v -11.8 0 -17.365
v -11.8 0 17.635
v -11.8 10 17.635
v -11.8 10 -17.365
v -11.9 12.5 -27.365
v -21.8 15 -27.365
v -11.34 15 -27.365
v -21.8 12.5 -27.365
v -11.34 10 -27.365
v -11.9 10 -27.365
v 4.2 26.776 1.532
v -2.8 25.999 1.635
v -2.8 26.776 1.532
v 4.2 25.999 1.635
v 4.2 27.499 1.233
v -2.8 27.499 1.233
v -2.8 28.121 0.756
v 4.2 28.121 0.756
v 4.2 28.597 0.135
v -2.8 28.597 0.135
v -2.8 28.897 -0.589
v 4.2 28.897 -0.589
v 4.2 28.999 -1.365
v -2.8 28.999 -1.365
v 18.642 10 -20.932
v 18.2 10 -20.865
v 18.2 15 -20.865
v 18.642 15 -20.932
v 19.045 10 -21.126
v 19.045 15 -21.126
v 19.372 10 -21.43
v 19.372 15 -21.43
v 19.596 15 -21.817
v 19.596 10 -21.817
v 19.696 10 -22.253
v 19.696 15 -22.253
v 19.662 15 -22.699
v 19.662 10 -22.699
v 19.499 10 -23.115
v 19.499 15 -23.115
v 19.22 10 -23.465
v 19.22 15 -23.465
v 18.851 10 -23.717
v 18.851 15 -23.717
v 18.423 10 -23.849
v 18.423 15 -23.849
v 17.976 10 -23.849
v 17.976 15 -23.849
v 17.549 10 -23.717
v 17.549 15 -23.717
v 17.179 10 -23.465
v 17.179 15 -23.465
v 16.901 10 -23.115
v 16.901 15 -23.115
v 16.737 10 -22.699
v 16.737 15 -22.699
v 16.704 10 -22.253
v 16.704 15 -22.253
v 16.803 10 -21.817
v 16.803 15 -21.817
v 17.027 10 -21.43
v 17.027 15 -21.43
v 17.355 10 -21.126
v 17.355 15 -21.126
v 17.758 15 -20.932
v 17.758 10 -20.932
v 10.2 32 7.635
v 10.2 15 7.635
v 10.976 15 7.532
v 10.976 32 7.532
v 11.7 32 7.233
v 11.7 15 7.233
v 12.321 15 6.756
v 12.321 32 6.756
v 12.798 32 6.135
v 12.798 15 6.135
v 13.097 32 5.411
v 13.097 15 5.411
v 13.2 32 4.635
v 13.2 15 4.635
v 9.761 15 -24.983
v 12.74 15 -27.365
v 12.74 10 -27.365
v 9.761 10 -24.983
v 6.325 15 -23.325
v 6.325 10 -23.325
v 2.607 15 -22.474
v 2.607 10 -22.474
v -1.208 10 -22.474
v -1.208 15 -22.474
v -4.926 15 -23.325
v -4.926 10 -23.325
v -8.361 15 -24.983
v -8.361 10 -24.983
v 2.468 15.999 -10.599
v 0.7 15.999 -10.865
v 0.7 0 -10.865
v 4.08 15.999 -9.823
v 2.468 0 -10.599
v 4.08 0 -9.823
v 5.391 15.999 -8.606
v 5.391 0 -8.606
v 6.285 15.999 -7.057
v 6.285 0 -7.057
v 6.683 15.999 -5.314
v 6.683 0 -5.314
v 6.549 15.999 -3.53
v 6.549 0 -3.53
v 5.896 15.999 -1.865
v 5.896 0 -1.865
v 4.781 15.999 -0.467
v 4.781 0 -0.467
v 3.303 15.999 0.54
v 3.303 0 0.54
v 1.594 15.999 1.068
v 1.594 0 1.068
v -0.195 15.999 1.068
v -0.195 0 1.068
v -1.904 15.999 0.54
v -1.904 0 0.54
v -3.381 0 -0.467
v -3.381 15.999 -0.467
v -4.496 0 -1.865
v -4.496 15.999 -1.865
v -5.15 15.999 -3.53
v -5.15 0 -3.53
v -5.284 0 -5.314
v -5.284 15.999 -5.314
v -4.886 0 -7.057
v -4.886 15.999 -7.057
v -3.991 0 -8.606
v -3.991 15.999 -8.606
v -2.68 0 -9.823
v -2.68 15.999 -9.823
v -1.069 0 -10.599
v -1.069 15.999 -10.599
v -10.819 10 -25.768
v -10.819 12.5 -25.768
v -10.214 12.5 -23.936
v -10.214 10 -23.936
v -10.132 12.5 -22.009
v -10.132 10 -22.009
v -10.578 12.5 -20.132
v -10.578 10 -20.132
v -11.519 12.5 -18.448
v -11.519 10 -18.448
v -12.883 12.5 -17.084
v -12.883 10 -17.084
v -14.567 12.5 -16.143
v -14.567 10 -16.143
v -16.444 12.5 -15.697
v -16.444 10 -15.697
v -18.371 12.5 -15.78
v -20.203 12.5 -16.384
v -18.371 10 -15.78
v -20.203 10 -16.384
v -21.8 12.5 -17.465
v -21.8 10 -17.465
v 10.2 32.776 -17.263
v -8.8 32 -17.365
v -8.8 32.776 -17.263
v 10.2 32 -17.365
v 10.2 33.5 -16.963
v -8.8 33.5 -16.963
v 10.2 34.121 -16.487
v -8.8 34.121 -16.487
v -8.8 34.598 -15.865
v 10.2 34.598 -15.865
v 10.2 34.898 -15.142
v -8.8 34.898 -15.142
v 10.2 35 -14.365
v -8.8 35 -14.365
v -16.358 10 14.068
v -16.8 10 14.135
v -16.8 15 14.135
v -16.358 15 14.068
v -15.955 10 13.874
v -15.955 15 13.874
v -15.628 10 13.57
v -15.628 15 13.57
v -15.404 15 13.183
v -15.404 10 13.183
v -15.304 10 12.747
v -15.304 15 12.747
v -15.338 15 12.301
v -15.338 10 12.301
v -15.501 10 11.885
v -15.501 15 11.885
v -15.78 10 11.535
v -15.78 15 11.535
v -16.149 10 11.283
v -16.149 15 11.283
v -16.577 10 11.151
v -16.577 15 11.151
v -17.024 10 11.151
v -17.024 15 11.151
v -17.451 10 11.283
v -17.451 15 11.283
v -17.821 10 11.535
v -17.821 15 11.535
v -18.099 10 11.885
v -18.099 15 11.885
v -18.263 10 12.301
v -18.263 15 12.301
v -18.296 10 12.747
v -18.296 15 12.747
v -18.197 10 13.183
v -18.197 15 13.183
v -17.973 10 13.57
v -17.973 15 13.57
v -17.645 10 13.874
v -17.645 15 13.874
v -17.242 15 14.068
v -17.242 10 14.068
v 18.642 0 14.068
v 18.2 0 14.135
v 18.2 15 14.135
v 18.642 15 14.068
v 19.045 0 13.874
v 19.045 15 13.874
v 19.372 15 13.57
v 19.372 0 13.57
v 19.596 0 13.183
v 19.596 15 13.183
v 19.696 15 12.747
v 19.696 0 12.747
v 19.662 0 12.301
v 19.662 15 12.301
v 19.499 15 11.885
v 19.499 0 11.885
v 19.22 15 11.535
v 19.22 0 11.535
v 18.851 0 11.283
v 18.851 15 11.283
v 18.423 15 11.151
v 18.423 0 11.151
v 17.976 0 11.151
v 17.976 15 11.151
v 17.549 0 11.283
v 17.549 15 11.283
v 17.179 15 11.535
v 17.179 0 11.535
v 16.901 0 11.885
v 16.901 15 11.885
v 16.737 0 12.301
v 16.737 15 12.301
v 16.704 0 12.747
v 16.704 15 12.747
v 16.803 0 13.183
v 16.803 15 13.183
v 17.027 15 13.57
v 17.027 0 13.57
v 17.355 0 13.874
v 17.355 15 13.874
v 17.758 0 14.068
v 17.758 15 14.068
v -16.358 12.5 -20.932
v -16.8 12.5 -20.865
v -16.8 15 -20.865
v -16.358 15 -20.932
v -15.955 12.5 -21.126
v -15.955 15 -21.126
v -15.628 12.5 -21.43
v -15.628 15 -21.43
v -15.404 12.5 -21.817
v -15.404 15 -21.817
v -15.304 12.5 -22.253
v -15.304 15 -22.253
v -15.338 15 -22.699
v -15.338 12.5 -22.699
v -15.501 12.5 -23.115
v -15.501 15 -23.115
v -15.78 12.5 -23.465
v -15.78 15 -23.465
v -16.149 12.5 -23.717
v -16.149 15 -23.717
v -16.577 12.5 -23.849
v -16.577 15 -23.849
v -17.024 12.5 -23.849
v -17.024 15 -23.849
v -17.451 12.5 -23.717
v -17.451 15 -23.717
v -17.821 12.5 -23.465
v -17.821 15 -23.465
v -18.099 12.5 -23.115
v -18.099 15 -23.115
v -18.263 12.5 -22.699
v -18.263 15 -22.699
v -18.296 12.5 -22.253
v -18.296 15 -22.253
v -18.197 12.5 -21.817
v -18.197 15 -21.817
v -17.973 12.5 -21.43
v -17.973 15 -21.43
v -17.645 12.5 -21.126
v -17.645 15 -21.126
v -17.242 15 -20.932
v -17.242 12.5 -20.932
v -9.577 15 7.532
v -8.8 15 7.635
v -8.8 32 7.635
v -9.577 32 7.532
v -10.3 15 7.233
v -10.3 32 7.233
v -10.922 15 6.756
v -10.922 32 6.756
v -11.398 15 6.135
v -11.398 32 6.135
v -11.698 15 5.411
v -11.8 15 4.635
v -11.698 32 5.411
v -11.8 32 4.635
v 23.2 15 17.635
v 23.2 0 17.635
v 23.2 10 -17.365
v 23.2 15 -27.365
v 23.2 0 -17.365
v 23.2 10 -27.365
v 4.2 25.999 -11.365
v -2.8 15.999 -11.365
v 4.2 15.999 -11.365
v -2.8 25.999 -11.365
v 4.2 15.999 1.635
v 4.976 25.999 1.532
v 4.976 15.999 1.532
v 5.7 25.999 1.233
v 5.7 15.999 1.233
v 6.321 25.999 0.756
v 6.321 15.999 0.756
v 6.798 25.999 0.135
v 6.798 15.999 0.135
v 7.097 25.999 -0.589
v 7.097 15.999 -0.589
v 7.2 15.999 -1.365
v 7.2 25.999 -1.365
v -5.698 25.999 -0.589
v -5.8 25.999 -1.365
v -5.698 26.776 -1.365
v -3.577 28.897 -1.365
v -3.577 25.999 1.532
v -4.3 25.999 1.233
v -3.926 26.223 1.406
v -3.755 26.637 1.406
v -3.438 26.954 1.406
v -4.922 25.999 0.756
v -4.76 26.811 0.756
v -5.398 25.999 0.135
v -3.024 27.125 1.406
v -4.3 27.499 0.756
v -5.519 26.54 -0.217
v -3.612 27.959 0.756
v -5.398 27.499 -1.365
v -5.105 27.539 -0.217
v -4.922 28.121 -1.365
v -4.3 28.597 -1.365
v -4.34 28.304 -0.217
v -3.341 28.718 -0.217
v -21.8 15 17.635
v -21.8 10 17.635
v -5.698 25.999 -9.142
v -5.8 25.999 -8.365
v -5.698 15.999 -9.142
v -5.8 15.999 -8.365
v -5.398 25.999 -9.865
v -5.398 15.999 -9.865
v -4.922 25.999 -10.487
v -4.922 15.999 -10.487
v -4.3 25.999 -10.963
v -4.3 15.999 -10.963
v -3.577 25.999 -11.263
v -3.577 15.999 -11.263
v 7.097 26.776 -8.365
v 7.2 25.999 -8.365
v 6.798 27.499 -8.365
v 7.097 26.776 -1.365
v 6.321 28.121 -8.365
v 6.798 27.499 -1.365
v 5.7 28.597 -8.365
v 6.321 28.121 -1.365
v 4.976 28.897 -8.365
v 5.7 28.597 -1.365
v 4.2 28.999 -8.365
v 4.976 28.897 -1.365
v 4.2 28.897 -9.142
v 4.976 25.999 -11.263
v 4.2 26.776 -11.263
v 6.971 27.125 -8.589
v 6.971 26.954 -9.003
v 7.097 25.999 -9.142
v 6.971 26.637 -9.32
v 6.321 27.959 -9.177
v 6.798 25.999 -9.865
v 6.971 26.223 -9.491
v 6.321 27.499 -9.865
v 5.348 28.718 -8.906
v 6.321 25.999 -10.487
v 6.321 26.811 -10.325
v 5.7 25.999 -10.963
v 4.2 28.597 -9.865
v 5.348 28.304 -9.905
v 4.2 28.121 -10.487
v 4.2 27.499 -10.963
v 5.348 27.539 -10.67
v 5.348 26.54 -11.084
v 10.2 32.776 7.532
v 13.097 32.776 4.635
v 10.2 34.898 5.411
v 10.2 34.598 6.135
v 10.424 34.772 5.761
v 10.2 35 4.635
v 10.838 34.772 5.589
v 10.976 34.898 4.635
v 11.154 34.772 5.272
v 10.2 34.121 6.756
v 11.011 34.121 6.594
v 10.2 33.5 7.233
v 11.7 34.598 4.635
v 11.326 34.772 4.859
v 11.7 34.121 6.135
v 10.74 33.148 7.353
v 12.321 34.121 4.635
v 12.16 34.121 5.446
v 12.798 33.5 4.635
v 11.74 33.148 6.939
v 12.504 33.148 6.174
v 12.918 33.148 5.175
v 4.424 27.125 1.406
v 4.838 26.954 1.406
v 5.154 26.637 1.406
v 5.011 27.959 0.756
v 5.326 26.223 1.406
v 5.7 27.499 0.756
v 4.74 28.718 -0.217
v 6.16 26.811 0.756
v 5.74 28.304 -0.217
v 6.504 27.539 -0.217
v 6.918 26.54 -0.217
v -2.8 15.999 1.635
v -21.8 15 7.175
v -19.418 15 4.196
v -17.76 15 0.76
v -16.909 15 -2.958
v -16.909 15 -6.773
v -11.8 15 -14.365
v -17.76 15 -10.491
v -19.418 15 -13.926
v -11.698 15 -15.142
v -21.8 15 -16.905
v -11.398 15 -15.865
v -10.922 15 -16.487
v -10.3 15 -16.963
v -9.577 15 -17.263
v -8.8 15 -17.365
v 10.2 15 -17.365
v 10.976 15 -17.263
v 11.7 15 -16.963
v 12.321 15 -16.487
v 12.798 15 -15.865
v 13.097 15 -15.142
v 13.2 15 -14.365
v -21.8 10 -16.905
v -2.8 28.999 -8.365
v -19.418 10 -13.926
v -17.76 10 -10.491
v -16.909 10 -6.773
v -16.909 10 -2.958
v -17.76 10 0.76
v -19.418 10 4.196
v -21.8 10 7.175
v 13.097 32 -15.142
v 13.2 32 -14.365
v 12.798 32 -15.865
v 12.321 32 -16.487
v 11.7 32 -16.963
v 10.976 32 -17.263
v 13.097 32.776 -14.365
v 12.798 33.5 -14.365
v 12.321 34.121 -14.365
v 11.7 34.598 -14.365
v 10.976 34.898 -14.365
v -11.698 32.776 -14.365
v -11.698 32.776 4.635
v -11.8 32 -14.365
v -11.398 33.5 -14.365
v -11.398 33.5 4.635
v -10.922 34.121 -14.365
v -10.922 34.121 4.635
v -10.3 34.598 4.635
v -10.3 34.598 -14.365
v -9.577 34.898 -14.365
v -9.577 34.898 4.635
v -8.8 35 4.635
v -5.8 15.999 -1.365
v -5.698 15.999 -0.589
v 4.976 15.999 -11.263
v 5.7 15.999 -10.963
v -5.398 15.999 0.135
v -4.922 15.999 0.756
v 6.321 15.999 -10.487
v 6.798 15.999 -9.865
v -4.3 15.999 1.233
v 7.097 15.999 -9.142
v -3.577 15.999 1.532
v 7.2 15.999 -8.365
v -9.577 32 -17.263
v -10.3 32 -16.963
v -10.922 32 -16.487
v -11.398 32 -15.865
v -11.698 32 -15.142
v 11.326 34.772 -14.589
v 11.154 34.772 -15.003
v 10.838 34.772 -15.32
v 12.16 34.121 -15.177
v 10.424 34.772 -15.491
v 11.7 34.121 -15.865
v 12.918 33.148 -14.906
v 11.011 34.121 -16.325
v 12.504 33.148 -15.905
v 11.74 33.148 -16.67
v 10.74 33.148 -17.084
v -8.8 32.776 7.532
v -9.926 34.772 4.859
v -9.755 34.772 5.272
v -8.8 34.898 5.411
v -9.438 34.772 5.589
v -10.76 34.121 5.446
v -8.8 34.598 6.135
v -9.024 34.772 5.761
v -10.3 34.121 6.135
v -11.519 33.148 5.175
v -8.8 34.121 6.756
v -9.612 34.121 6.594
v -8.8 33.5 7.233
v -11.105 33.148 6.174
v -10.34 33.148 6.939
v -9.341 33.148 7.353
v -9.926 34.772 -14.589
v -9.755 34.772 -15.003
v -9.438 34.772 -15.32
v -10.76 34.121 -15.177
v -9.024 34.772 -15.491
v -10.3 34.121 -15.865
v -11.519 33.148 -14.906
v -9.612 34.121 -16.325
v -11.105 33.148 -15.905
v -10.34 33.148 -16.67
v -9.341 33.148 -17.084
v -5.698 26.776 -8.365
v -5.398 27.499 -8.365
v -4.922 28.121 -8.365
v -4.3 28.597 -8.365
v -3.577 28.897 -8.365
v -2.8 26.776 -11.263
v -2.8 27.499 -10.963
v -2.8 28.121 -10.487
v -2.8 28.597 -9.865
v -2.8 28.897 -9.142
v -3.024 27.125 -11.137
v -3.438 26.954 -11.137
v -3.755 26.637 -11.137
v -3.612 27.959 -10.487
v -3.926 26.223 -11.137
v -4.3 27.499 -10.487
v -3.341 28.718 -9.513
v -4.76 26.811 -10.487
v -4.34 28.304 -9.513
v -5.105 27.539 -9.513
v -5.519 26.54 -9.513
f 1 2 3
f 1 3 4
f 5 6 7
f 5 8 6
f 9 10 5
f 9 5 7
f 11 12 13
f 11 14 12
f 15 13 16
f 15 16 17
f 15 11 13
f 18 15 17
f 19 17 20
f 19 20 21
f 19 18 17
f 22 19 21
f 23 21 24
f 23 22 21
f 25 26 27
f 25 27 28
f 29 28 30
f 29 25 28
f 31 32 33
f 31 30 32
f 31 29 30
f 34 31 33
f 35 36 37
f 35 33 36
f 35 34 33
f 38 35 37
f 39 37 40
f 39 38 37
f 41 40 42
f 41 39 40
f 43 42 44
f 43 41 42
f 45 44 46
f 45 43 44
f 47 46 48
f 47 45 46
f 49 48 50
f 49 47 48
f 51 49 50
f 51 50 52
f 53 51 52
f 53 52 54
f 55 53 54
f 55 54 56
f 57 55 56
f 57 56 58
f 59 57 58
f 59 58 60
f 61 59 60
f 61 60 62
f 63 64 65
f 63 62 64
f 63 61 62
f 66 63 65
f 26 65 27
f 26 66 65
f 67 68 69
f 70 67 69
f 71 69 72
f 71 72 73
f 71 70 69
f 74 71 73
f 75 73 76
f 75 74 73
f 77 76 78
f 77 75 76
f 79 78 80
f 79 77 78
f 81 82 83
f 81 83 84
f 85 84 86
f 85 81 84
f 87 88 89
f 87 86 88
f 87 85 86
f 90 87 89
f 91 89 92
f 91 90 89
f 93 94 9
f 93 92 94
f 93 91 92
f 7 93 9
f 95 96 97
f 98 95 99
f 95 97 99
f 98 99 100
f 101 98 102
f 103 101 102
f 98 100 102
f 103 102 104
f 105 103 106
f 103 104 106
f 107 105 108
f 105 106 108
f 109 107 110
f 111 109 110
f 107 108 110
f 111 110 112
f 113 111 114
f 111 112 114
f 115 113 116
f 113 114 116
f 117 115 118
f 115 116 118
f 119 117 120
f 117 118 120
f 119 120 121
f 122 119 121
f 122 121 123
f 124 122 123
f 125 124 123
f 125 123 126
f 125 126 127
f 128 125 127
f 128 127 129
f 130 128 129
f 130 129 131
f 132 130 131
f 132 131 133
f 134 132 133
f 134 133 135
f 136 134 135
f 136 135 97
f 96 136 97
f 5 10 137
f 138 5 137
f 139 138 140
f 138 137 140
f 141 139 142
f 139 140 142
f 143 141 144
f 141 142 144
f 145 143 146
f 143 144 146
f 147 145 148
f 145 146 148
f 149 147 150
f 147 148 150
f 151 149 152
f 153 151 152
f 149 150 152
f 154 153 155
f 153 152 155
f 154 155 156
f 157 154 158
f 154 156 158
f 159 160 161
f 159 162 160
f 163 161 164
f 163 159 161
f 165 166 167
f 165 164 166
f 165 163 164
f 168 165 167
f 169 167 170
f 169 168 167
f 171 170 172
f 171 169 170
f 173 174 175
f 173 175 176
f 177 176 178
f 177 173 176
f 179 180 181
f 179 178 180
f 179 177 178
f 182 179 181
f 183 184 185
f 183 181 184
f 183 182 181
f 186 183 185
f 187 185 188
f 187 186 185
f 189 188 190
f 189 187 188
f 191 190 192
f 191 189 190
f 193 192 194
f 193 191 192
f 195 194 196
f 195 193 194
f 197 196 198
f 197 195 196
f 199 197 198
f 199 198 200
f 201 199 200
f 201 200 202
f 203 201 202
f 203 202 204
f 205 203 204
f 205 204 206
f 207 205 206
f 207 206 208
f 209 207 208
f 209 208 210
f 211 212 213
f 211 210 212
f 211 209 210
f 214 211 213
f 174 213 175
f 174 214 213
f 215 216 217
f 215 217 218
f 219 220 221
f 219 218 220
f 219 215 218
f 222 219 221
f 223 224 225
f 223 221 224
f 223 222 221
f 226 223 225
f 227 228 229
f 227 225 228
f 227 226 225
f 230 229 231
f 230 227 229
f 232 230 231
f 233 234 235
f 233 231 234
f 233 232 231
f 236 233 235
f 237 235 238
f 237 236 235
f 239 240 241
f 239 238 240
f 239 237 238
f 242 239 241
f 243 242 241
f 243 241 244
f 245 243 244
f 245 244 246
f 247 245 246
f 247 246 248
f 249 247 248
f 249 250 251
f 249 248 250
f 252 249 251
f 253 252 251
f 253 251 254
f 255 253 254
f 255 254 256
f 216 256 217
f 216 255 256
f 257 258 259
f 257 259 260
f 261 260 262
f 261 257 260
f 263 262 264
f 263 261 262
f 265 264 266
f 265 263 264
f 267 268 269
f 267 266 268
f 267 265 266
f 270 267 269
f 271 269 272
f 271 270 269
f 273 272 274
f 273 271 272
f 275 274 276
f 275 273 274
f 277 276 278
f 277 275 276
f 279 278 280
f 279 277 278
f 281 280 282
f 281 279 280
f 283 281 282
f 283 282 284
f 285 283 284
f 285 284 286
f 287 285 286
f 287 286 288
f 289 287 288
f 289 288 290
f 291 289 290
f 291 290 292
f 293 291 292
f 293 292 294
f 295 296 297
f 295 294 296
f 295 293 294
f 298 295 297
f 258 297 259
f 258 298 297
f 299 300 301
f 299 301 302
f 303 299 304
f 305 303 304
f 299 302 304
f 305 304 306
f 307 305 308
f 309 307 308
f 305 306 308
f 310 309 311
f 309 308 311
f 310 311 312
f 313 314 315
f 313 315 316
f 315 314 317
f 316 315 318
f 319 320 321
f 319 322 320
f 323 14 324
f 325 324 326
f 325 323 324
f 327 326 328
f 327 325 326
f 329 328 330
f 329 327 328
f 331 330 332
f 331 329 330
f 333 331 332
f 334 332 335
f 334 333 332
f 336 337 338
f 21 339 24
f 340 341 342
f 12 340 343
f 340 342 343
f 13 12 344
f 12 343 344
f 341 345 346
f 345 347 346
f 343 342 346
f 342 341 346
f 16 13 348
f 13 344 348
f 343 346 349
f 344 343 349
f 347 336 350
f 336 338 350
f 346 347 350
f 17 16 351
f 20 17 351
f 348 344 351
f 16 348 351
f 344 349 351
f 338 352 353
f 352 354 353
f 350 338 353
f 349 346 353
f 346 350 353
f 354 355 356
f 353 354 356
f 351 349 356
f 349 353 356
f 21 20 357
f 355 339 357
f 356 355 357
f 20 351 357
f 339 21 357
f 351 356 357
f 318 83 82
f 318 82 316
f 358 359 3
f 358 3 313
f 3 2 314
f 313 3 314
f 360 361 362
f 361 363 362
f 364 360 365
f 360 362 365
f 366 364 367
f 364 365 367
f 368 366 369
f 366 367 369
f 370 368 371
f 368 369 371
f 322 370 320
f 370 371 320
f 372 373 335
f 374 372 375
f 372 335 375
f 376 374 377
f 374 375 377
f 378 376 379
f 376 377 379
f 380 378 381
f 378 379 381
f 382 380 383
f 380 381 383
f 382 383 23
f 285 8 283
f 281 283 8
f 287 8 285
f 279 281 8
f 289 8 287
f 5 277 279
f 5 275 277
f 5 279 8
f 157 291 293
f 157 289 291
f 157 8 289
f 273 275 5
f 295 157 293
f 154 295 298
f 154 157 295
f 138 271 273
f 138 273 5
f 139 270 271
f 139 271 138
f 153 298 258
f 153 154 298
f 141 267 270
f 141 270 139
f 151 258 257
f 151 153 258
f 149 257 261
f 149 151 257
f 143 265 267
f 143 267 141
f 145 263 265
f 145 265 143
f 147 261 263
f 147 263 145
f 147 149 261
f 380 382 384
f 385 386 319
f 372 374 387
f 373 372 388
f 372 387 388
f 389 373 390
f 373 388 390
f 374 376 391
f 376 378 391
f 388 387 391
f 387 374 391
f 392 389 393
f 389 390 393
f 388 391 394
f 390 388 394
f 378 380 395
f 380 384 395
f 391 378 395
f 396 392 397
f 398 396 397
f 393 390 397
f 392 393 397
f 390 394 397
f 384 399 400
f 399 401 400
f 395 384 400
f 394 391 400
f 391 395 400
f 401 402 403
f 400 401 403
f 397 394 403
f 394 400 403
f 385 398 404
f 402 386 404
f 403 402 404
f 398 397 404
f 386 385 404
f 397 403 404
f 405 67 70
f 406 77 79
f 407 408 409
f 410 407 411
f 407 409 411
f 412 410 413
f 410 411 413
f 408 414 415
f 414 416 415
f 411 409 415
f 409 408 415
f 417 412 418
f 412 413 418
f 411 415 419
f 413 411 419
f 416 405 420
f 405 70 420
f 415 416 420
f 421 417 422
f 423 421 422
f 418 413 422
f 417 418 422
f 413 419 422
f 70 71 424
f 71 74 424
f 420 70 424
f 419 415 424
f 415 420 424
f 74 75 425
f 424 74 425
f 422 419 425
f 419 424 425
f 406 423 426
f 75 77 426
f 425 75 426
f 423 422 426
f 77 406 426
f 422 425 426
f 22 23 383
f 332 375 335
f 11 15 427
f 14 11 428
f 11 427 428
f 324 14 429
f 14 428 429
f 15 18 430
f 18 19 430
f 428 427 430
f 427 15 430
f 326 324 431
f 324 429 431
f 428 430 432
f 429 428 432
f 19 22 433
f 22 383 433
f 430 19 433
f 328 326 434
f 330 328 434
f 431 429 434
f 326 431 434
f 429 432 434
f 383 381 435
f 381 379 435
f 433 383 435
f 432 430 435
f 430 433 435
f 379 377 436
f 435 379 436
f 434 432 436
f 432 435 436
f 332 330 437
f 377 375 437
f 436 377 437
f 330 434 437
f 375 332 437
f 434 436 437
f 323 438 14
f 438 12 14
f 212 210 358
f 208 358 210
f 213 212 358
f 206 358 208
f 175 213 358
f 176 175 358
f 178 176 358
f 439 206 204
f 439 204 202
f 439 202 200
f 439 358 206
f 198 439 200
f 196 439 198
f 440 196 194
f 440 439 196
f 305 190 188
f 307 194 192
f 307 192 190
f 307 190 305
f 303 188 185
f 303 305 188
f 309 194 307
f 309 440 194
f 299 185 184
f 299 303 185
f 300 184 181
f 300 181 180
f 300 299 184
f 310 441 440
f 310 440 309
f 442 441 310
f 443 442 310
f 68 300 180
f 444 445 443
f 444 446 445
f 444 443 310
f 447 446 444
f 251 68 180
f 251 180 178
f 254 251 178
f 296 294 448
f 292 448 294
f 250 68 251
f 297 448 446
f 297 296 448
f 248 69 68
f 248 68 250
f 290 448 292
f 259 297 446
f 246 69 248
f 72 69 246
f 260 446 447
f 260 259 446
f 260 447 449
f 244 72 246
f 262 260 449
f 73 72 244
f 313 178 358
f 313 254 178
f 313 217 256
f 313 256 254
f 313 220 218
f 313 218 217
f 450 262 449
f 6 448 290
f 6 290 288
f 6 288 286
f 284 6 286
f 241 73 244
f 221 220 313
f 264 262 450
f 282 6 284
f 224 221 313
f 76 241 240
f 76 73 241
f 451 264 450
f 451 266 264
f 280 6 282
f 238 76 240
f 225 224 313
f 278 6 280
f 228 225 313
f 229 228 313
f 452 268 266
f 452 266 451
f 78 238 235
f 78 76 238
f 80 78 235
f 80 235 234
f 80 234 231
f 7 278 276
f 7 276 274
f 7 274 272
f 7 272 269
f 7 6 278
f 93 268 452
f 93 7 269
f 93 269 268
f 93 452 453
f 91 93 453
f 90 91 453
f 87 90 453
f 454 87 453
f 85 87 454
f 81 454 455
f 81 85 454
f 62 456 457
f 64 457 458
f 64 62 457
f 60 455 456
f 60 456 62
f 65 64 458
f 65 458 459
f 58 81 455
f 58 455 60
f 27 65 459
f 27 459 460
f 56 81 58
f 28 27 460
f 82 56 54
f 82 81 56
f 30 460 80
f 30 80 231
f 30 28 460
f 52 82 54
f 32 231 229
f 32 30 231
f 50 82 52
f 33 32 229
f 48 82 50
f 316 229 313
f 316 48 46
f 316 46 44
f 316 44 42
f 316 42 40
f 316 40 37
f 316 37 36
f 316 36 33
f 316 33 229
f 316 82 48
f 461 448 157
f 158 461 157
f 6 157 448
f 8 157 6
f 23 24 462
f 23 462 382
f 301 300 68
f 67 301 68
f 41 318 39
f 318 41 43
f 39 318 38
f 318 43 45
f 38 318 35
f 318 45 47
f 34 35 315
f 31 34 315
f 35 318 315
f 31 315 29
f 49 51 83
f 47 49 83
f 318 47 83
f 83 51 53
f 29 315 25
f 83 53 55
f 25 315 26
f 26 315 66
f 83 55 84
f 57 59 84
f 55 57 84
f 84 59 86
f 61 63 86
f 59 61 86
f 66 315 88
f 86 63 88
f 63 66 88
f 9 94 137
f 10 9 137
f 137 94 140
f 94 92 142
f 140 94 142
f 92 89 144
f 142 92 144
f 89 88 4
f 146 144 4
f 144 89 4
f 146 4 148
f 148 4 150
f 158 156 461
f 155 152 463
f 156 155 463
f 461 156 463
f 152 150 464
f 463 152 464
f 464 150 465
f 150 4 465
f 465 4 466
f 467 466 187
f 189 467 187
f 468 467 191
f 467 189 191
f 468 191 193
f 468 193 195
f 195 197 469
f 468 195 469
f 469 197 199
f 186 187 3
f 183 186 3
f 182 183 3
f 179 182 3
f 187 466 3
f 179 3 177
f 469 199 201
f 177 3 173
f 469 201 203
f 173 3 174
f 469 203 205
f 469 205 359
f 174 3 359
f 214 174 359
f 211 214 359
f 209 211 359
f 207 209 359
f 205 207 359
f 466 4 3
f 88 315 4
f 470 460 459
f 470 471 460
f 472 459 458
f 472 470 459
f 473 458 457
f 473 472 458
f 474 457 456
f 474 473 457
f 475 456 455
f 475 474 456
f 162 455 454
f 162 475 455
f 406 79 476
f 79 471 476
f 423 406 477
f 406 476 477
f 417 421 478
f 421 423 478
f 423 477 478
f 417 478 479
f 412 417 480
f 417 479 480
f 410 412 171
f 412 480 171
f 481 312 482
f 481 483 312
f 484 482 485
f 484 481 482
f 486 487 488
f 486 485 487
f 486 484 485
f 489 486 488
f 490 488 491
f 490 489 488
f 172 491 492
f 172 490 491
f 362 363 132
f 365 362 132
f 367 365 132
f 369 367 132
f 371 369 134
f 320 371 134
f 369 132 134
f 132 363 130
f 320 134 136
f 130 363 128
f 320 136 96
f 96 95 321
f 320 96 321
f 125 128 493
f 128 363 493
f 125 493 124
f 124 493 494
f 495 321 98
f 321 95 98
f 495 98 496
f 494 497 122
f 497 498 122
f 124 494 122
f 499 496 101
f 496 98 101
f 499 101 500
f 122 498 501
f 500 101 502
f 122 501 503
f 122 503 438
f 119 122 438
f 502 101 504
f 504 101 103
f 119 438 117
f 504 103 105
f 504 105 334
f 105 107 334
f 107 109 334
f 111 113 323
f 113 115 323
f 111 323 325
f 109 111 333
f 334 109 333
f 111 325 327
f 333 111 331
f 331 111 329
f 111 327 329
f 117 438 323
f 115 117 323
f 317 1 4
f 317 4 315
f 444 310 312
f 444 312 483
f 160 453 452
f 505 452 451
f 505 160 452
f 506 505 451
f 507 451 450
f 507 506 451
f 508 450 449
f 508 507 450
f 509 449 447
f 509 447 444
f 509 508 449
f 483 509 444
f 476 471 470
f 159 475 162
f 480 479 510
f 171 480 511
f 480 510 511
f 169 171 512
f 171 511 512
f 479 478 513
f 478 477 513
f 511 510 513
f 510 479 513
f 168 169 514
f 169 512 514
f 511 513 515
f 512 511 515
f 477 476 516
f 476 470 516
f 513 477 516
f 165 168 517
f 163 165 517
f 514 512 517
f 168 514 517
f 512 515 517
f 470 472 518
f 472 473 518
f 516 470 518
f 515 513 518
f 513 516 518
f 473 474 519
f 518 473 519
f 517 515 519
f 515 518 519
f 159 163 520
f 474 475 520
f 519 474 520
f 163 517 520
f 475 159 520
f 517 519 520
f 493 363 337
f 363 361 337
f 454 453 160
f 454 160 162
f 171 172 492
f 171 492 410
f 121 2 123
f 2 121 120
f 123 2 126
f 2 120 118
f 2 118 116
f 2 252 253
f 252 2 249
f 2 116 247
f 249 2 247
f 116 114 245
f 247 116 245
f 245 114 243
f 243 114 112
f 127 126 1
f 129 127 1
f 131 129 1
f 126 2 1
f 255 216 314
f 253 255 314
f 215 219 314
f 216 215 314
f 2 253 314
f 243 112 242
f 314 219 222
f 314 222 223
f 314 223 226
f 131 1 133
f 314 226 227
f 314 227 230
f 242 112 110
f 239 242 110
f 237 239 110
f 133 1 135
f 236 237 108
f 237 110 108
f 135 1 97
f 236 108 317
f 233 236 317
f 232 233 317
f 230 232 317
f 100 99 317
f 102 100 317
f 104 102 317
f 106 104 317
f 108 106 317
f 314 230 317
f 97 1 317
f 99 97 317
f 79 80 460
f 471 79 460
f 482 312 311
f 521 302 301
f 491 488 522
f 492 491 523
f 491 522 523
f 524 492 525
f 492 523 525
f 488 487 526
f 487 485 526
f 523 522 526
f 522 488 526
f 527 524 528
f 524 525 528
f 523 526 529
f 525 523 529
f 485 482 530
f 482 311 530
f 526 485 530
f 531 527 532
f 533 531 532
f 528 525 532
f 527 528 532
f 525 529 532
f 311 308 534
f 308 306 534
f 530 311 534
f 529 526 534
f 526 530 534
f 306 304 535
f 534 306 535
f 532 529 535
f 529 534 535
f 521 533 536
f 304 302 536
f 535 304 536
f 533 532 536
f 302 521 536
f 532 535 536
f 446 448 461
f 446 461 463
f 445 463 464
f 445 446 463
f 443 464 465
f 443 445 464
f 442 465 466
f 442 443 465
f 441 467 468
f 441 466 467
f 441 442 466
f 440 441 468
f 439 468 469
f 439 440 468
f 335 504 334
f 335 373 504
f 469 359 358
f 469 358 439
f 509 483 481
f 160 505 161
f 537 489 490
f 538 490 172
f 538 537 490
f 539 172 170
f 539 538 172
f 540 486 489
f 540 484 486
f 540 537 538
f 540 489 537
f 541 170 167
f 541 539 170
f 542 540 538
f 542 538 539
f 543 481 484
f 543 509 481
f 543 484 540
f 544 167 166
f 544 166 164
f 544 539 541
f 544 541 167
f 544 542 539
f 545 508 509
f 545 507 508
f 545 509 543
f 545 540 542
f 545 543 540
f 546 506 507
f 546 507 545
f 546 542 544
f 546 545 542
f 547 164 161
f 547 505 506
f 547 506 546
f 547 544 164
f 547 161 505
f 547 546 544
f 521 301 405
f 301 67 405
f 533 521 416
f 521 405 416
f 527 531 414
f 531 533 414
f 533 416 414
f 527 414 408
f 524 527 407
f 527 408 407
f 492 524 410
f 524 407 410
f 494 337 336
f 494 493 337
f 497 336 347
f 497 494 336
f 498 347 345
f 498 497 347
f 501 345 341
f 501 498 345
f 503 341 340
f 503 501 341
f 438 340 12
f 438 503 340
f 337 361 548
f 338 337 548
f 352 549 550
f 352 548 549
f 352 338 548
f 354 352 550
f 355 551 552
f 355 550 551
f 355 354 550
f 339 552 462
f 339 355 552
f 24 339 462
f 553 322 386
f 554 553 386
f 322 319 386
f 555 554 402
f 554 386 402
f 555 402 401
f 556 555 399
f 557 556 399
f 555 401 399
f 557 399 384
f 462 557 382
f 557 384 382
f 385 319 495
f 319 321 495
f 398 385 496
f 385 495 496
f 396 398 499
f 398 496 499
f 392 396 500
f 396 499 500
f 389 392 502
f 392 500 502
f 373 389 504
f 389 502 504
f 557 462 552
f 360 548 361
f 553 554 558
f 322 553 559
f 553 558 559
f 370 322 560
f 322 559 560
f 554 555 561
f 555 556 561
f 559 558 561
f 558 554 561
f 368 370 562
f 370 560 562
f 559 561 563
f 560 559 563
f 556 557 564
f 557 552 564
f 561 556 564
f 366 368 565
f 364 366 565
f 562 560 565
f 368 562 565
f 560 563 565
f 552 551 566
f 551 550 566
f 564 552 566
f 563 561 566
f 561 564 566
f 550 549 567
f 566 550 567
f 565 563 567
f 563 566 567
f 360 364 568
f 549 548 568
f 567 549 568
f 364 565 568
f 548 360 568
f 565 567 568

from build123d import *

# Parameters (mm, degrees)
SKETCH1_W               = 45
SKETCH1_H               = 45
BOSS_EXTRUDE1_DEPTH     = 15
CUT_EXTRUDE1_DEPTH      = 10
CUT_EXTRUDE2_DEPTH      = 38.243644172
CUT_EXTRUDE2_DEPTH_BACK = 38.243644172
CUT_EXTRUDE3_DEPTH      = 2.5
SKETCH5_W               = 25
SKETCH5_H               = 25
BOSS_EXTRUDE2_DEPTH     = 20
FILLET1_R               = 3
SKETCH6_R               = 6
CUT_EXTRUDE4_DEPTH      = 28.99918
SKETCH7_W               = 13
SKETCH7_H               = 13
CUT_EXTRUDE5_DEPTH      = 13
FILLET2_R               = 3
CUT_EXTRUDE6_DEPTH      = 42.074189356
CUT_EXTRUDE6_DEPTH_BACK = 42.074189356
SKETCH8_R               = 1.5


with BuildPart() as part:
    # Sketch1 → Boss-Extrude1 (new body)
    with BuildSketch(Plane(origin=(0, 0, 0), x_dir=(1, 0, 0), z_dir=(0, 1, 0))):
        with Locations((0.699698795, 4.865361446)):
            Rectangle(SKETCH1_W, SKETCH1_H)
    extrude(amount=BOSS_EXTRUDE1_DEPTH)

    # Sketch2 → Cut-Extrude1 (cut)
    with BuildSketch(Plane.XZ):
        Polygon((-21.800301205, 17.634638554), (-11.800301205, 17.634638554), (-11.800301205, -17.365361446), (23.199698795, -17.365361446), (23.199698795, -27.365361446), (-21.800301205, -27.365361446), align=None)
    extrude(amount=-CUT_EXTRUDE1_DEPTH, mode=Mode.SUBTRACT)

    # Sketch3 → Cut-Extrude2 (cut, two sides: drawn at the far end of the back side and taken through both)
    with BuildSketch(Plane.XZ.offset(-10).offset(-CUT_EXTRUDE2_DEPTH_BACK)):
        with BuildLine():
            Line((-11.340301205, -27.365361446), (12.739698795, -27.365361446))
            ThreePointArc((12.739698795, -27.365361446), (0.699698795, -22.366961339), (-11.340301205, -27.365361446))
        make_face()
        with BuildLine():
            Line((-21.800301205, 7.174638554), (-21.800301205, -16.905361446))
            ThreePointArc((-21.800301205, -16.905361446), (-16.801901098, -4.865361446), (-21.800301205, 7.174638554))
        make_face()
    extrude(amount=CUT_EXTRUDE2_DEPTH + CUT_EXTRUDE2_DEPTH_BACK, mode=Mode.SUBTRACT)

    # Sketch4 → Cut-Extrude3 (cut)
    with BuildSketch(Plane.XZ.offset(-10)):
        with BuildLine():
            Line((-21.800301205, -17.465361446), (-21.800301205, -27.365361446))
            Line((-21.800301205, -27.365361446), (-11.900301205, -27.365361446))
            ThreePointArc((-11.900301205, -27.365361446), (-12.153386497, -17.718446738), (-21.800301205, -17.465361446))
        make_face()
    extrude(amount=-CUT_EXTRUDE3_DEPTH, mode=Mode.SUBTRACT)

    # Sketch5 → Boss-Extrude2 (add)
    with BuildSketch(Plane(origin=(0, 15, 0), x_dir=(1, 0, 0), z_dir=(0, 1, 0))):
        with Locations((0.699698795, 4.865361446)):
            Rectangle(SKETCH5_W, SKETCH5_H)
    extrude(amount=BOSS_EXTRUDE2_DEPTH)

    # Fillet1
    fillet1_edges = [part.edges().sort_by_distance(p)[0] for p in [
        (-11.800301205, 25, -17.365361446),
        (-11.800301205, 25, 7.634638554),
        (13.199698795, 25, 7.634638554),
        (13.199698795, 25, -17.365361446),
        (-11.800301205, 35, -4.865361446),
        (0.699698795, 35, 7.634638554),
        (13.199698795, 35, -4.865361446),
        (0.699698795, 35, -17.365361446),
    ]]
    fillet(fillet1_edges, radius=FILLET1_R)

    # Sketch6 → Cut-Extrude4 (cut)
    with BuildSketch(Plane(origin=(0, 0, 0), x_dir=(-1, 0, 0), z_dir=(0, -1, 0))):
        with Locations(Location((-0.699698795, 4.865361446, 0), (0, 0, 90))):
            Circle(SKETCH6_R)
    extrude(amount=-CUT_EXTRUDE4_DEPTH, mode=Mode.SUBTRACT)

    # Sketch7 → Cut-Extrude5 (cut)
    with BuildSketch(Plane.XZ.offset(-28.99918)):
        with Locations((0.699698795, -4.865361446)):
            Rectangle(SKETCH7_W, SKETCH7_H)
    extrude(amount=CUT_EXTRUDE5_DEPTH, mode=Mode.SUBTRACT)

    # Fillet2
    fillet2_edges = [part.edges().sort_by_distance(p)[0] for p in [
        (-5.800301205, 28.99918, -4.865361446),
        (-5.800301205, 22.49918, 1.634638554),
        (0.699698795, 28.99918, -11.365361446),
        (-5.800301205, 22.49918, -11.365361446),
        (7.199698795, 28.99918, -4.865361446),
        (7.199698795, 22.49918, -11.365361446),
        (0.699698795, 28.99918, 1.634638554),
        (7.199698795, 22.49918, 1.634638554),
    ]]
    fillet(fillet2_edges, radius=FILLET2_R)

    # Sketch8 → Cut-Extrude6 (cut, two sides: drawn at the far end of the back side and taken through both)
    with BuildSketch(Plane(origin=(0, 15, 0), x_dir=(1, 0, 0), z_dir=(0, 1, 0)).offset(-CUT_EXTRUDE6_DEPTH_BACK)):
        with Locations(Location((-16.800301205, 22.365361446, 0), (0, 0, 270))):
            Circle(SKETCH8_R)
        with Locations(Location((18.199698795, 22.365361446, 0), (0, 0, 270))):
            Circle(SKETCH8_R)
        with Locations(Location((18.199698795, -12.634638554, 0), (0, 0, 270))):
            Circle(SKETCH8_R)
        with Locations(Location((-16.800301205, -12.634638554, 0), (0, 0, 270))):
            Circle(SKETCH8_R)
    extrude(amount=CUT_EXTRUDE6_DEPTH + CUT_EXTRUDE6_DEPTH_BACK, mode=Mode.SUBTRACT)


solid = part.part
